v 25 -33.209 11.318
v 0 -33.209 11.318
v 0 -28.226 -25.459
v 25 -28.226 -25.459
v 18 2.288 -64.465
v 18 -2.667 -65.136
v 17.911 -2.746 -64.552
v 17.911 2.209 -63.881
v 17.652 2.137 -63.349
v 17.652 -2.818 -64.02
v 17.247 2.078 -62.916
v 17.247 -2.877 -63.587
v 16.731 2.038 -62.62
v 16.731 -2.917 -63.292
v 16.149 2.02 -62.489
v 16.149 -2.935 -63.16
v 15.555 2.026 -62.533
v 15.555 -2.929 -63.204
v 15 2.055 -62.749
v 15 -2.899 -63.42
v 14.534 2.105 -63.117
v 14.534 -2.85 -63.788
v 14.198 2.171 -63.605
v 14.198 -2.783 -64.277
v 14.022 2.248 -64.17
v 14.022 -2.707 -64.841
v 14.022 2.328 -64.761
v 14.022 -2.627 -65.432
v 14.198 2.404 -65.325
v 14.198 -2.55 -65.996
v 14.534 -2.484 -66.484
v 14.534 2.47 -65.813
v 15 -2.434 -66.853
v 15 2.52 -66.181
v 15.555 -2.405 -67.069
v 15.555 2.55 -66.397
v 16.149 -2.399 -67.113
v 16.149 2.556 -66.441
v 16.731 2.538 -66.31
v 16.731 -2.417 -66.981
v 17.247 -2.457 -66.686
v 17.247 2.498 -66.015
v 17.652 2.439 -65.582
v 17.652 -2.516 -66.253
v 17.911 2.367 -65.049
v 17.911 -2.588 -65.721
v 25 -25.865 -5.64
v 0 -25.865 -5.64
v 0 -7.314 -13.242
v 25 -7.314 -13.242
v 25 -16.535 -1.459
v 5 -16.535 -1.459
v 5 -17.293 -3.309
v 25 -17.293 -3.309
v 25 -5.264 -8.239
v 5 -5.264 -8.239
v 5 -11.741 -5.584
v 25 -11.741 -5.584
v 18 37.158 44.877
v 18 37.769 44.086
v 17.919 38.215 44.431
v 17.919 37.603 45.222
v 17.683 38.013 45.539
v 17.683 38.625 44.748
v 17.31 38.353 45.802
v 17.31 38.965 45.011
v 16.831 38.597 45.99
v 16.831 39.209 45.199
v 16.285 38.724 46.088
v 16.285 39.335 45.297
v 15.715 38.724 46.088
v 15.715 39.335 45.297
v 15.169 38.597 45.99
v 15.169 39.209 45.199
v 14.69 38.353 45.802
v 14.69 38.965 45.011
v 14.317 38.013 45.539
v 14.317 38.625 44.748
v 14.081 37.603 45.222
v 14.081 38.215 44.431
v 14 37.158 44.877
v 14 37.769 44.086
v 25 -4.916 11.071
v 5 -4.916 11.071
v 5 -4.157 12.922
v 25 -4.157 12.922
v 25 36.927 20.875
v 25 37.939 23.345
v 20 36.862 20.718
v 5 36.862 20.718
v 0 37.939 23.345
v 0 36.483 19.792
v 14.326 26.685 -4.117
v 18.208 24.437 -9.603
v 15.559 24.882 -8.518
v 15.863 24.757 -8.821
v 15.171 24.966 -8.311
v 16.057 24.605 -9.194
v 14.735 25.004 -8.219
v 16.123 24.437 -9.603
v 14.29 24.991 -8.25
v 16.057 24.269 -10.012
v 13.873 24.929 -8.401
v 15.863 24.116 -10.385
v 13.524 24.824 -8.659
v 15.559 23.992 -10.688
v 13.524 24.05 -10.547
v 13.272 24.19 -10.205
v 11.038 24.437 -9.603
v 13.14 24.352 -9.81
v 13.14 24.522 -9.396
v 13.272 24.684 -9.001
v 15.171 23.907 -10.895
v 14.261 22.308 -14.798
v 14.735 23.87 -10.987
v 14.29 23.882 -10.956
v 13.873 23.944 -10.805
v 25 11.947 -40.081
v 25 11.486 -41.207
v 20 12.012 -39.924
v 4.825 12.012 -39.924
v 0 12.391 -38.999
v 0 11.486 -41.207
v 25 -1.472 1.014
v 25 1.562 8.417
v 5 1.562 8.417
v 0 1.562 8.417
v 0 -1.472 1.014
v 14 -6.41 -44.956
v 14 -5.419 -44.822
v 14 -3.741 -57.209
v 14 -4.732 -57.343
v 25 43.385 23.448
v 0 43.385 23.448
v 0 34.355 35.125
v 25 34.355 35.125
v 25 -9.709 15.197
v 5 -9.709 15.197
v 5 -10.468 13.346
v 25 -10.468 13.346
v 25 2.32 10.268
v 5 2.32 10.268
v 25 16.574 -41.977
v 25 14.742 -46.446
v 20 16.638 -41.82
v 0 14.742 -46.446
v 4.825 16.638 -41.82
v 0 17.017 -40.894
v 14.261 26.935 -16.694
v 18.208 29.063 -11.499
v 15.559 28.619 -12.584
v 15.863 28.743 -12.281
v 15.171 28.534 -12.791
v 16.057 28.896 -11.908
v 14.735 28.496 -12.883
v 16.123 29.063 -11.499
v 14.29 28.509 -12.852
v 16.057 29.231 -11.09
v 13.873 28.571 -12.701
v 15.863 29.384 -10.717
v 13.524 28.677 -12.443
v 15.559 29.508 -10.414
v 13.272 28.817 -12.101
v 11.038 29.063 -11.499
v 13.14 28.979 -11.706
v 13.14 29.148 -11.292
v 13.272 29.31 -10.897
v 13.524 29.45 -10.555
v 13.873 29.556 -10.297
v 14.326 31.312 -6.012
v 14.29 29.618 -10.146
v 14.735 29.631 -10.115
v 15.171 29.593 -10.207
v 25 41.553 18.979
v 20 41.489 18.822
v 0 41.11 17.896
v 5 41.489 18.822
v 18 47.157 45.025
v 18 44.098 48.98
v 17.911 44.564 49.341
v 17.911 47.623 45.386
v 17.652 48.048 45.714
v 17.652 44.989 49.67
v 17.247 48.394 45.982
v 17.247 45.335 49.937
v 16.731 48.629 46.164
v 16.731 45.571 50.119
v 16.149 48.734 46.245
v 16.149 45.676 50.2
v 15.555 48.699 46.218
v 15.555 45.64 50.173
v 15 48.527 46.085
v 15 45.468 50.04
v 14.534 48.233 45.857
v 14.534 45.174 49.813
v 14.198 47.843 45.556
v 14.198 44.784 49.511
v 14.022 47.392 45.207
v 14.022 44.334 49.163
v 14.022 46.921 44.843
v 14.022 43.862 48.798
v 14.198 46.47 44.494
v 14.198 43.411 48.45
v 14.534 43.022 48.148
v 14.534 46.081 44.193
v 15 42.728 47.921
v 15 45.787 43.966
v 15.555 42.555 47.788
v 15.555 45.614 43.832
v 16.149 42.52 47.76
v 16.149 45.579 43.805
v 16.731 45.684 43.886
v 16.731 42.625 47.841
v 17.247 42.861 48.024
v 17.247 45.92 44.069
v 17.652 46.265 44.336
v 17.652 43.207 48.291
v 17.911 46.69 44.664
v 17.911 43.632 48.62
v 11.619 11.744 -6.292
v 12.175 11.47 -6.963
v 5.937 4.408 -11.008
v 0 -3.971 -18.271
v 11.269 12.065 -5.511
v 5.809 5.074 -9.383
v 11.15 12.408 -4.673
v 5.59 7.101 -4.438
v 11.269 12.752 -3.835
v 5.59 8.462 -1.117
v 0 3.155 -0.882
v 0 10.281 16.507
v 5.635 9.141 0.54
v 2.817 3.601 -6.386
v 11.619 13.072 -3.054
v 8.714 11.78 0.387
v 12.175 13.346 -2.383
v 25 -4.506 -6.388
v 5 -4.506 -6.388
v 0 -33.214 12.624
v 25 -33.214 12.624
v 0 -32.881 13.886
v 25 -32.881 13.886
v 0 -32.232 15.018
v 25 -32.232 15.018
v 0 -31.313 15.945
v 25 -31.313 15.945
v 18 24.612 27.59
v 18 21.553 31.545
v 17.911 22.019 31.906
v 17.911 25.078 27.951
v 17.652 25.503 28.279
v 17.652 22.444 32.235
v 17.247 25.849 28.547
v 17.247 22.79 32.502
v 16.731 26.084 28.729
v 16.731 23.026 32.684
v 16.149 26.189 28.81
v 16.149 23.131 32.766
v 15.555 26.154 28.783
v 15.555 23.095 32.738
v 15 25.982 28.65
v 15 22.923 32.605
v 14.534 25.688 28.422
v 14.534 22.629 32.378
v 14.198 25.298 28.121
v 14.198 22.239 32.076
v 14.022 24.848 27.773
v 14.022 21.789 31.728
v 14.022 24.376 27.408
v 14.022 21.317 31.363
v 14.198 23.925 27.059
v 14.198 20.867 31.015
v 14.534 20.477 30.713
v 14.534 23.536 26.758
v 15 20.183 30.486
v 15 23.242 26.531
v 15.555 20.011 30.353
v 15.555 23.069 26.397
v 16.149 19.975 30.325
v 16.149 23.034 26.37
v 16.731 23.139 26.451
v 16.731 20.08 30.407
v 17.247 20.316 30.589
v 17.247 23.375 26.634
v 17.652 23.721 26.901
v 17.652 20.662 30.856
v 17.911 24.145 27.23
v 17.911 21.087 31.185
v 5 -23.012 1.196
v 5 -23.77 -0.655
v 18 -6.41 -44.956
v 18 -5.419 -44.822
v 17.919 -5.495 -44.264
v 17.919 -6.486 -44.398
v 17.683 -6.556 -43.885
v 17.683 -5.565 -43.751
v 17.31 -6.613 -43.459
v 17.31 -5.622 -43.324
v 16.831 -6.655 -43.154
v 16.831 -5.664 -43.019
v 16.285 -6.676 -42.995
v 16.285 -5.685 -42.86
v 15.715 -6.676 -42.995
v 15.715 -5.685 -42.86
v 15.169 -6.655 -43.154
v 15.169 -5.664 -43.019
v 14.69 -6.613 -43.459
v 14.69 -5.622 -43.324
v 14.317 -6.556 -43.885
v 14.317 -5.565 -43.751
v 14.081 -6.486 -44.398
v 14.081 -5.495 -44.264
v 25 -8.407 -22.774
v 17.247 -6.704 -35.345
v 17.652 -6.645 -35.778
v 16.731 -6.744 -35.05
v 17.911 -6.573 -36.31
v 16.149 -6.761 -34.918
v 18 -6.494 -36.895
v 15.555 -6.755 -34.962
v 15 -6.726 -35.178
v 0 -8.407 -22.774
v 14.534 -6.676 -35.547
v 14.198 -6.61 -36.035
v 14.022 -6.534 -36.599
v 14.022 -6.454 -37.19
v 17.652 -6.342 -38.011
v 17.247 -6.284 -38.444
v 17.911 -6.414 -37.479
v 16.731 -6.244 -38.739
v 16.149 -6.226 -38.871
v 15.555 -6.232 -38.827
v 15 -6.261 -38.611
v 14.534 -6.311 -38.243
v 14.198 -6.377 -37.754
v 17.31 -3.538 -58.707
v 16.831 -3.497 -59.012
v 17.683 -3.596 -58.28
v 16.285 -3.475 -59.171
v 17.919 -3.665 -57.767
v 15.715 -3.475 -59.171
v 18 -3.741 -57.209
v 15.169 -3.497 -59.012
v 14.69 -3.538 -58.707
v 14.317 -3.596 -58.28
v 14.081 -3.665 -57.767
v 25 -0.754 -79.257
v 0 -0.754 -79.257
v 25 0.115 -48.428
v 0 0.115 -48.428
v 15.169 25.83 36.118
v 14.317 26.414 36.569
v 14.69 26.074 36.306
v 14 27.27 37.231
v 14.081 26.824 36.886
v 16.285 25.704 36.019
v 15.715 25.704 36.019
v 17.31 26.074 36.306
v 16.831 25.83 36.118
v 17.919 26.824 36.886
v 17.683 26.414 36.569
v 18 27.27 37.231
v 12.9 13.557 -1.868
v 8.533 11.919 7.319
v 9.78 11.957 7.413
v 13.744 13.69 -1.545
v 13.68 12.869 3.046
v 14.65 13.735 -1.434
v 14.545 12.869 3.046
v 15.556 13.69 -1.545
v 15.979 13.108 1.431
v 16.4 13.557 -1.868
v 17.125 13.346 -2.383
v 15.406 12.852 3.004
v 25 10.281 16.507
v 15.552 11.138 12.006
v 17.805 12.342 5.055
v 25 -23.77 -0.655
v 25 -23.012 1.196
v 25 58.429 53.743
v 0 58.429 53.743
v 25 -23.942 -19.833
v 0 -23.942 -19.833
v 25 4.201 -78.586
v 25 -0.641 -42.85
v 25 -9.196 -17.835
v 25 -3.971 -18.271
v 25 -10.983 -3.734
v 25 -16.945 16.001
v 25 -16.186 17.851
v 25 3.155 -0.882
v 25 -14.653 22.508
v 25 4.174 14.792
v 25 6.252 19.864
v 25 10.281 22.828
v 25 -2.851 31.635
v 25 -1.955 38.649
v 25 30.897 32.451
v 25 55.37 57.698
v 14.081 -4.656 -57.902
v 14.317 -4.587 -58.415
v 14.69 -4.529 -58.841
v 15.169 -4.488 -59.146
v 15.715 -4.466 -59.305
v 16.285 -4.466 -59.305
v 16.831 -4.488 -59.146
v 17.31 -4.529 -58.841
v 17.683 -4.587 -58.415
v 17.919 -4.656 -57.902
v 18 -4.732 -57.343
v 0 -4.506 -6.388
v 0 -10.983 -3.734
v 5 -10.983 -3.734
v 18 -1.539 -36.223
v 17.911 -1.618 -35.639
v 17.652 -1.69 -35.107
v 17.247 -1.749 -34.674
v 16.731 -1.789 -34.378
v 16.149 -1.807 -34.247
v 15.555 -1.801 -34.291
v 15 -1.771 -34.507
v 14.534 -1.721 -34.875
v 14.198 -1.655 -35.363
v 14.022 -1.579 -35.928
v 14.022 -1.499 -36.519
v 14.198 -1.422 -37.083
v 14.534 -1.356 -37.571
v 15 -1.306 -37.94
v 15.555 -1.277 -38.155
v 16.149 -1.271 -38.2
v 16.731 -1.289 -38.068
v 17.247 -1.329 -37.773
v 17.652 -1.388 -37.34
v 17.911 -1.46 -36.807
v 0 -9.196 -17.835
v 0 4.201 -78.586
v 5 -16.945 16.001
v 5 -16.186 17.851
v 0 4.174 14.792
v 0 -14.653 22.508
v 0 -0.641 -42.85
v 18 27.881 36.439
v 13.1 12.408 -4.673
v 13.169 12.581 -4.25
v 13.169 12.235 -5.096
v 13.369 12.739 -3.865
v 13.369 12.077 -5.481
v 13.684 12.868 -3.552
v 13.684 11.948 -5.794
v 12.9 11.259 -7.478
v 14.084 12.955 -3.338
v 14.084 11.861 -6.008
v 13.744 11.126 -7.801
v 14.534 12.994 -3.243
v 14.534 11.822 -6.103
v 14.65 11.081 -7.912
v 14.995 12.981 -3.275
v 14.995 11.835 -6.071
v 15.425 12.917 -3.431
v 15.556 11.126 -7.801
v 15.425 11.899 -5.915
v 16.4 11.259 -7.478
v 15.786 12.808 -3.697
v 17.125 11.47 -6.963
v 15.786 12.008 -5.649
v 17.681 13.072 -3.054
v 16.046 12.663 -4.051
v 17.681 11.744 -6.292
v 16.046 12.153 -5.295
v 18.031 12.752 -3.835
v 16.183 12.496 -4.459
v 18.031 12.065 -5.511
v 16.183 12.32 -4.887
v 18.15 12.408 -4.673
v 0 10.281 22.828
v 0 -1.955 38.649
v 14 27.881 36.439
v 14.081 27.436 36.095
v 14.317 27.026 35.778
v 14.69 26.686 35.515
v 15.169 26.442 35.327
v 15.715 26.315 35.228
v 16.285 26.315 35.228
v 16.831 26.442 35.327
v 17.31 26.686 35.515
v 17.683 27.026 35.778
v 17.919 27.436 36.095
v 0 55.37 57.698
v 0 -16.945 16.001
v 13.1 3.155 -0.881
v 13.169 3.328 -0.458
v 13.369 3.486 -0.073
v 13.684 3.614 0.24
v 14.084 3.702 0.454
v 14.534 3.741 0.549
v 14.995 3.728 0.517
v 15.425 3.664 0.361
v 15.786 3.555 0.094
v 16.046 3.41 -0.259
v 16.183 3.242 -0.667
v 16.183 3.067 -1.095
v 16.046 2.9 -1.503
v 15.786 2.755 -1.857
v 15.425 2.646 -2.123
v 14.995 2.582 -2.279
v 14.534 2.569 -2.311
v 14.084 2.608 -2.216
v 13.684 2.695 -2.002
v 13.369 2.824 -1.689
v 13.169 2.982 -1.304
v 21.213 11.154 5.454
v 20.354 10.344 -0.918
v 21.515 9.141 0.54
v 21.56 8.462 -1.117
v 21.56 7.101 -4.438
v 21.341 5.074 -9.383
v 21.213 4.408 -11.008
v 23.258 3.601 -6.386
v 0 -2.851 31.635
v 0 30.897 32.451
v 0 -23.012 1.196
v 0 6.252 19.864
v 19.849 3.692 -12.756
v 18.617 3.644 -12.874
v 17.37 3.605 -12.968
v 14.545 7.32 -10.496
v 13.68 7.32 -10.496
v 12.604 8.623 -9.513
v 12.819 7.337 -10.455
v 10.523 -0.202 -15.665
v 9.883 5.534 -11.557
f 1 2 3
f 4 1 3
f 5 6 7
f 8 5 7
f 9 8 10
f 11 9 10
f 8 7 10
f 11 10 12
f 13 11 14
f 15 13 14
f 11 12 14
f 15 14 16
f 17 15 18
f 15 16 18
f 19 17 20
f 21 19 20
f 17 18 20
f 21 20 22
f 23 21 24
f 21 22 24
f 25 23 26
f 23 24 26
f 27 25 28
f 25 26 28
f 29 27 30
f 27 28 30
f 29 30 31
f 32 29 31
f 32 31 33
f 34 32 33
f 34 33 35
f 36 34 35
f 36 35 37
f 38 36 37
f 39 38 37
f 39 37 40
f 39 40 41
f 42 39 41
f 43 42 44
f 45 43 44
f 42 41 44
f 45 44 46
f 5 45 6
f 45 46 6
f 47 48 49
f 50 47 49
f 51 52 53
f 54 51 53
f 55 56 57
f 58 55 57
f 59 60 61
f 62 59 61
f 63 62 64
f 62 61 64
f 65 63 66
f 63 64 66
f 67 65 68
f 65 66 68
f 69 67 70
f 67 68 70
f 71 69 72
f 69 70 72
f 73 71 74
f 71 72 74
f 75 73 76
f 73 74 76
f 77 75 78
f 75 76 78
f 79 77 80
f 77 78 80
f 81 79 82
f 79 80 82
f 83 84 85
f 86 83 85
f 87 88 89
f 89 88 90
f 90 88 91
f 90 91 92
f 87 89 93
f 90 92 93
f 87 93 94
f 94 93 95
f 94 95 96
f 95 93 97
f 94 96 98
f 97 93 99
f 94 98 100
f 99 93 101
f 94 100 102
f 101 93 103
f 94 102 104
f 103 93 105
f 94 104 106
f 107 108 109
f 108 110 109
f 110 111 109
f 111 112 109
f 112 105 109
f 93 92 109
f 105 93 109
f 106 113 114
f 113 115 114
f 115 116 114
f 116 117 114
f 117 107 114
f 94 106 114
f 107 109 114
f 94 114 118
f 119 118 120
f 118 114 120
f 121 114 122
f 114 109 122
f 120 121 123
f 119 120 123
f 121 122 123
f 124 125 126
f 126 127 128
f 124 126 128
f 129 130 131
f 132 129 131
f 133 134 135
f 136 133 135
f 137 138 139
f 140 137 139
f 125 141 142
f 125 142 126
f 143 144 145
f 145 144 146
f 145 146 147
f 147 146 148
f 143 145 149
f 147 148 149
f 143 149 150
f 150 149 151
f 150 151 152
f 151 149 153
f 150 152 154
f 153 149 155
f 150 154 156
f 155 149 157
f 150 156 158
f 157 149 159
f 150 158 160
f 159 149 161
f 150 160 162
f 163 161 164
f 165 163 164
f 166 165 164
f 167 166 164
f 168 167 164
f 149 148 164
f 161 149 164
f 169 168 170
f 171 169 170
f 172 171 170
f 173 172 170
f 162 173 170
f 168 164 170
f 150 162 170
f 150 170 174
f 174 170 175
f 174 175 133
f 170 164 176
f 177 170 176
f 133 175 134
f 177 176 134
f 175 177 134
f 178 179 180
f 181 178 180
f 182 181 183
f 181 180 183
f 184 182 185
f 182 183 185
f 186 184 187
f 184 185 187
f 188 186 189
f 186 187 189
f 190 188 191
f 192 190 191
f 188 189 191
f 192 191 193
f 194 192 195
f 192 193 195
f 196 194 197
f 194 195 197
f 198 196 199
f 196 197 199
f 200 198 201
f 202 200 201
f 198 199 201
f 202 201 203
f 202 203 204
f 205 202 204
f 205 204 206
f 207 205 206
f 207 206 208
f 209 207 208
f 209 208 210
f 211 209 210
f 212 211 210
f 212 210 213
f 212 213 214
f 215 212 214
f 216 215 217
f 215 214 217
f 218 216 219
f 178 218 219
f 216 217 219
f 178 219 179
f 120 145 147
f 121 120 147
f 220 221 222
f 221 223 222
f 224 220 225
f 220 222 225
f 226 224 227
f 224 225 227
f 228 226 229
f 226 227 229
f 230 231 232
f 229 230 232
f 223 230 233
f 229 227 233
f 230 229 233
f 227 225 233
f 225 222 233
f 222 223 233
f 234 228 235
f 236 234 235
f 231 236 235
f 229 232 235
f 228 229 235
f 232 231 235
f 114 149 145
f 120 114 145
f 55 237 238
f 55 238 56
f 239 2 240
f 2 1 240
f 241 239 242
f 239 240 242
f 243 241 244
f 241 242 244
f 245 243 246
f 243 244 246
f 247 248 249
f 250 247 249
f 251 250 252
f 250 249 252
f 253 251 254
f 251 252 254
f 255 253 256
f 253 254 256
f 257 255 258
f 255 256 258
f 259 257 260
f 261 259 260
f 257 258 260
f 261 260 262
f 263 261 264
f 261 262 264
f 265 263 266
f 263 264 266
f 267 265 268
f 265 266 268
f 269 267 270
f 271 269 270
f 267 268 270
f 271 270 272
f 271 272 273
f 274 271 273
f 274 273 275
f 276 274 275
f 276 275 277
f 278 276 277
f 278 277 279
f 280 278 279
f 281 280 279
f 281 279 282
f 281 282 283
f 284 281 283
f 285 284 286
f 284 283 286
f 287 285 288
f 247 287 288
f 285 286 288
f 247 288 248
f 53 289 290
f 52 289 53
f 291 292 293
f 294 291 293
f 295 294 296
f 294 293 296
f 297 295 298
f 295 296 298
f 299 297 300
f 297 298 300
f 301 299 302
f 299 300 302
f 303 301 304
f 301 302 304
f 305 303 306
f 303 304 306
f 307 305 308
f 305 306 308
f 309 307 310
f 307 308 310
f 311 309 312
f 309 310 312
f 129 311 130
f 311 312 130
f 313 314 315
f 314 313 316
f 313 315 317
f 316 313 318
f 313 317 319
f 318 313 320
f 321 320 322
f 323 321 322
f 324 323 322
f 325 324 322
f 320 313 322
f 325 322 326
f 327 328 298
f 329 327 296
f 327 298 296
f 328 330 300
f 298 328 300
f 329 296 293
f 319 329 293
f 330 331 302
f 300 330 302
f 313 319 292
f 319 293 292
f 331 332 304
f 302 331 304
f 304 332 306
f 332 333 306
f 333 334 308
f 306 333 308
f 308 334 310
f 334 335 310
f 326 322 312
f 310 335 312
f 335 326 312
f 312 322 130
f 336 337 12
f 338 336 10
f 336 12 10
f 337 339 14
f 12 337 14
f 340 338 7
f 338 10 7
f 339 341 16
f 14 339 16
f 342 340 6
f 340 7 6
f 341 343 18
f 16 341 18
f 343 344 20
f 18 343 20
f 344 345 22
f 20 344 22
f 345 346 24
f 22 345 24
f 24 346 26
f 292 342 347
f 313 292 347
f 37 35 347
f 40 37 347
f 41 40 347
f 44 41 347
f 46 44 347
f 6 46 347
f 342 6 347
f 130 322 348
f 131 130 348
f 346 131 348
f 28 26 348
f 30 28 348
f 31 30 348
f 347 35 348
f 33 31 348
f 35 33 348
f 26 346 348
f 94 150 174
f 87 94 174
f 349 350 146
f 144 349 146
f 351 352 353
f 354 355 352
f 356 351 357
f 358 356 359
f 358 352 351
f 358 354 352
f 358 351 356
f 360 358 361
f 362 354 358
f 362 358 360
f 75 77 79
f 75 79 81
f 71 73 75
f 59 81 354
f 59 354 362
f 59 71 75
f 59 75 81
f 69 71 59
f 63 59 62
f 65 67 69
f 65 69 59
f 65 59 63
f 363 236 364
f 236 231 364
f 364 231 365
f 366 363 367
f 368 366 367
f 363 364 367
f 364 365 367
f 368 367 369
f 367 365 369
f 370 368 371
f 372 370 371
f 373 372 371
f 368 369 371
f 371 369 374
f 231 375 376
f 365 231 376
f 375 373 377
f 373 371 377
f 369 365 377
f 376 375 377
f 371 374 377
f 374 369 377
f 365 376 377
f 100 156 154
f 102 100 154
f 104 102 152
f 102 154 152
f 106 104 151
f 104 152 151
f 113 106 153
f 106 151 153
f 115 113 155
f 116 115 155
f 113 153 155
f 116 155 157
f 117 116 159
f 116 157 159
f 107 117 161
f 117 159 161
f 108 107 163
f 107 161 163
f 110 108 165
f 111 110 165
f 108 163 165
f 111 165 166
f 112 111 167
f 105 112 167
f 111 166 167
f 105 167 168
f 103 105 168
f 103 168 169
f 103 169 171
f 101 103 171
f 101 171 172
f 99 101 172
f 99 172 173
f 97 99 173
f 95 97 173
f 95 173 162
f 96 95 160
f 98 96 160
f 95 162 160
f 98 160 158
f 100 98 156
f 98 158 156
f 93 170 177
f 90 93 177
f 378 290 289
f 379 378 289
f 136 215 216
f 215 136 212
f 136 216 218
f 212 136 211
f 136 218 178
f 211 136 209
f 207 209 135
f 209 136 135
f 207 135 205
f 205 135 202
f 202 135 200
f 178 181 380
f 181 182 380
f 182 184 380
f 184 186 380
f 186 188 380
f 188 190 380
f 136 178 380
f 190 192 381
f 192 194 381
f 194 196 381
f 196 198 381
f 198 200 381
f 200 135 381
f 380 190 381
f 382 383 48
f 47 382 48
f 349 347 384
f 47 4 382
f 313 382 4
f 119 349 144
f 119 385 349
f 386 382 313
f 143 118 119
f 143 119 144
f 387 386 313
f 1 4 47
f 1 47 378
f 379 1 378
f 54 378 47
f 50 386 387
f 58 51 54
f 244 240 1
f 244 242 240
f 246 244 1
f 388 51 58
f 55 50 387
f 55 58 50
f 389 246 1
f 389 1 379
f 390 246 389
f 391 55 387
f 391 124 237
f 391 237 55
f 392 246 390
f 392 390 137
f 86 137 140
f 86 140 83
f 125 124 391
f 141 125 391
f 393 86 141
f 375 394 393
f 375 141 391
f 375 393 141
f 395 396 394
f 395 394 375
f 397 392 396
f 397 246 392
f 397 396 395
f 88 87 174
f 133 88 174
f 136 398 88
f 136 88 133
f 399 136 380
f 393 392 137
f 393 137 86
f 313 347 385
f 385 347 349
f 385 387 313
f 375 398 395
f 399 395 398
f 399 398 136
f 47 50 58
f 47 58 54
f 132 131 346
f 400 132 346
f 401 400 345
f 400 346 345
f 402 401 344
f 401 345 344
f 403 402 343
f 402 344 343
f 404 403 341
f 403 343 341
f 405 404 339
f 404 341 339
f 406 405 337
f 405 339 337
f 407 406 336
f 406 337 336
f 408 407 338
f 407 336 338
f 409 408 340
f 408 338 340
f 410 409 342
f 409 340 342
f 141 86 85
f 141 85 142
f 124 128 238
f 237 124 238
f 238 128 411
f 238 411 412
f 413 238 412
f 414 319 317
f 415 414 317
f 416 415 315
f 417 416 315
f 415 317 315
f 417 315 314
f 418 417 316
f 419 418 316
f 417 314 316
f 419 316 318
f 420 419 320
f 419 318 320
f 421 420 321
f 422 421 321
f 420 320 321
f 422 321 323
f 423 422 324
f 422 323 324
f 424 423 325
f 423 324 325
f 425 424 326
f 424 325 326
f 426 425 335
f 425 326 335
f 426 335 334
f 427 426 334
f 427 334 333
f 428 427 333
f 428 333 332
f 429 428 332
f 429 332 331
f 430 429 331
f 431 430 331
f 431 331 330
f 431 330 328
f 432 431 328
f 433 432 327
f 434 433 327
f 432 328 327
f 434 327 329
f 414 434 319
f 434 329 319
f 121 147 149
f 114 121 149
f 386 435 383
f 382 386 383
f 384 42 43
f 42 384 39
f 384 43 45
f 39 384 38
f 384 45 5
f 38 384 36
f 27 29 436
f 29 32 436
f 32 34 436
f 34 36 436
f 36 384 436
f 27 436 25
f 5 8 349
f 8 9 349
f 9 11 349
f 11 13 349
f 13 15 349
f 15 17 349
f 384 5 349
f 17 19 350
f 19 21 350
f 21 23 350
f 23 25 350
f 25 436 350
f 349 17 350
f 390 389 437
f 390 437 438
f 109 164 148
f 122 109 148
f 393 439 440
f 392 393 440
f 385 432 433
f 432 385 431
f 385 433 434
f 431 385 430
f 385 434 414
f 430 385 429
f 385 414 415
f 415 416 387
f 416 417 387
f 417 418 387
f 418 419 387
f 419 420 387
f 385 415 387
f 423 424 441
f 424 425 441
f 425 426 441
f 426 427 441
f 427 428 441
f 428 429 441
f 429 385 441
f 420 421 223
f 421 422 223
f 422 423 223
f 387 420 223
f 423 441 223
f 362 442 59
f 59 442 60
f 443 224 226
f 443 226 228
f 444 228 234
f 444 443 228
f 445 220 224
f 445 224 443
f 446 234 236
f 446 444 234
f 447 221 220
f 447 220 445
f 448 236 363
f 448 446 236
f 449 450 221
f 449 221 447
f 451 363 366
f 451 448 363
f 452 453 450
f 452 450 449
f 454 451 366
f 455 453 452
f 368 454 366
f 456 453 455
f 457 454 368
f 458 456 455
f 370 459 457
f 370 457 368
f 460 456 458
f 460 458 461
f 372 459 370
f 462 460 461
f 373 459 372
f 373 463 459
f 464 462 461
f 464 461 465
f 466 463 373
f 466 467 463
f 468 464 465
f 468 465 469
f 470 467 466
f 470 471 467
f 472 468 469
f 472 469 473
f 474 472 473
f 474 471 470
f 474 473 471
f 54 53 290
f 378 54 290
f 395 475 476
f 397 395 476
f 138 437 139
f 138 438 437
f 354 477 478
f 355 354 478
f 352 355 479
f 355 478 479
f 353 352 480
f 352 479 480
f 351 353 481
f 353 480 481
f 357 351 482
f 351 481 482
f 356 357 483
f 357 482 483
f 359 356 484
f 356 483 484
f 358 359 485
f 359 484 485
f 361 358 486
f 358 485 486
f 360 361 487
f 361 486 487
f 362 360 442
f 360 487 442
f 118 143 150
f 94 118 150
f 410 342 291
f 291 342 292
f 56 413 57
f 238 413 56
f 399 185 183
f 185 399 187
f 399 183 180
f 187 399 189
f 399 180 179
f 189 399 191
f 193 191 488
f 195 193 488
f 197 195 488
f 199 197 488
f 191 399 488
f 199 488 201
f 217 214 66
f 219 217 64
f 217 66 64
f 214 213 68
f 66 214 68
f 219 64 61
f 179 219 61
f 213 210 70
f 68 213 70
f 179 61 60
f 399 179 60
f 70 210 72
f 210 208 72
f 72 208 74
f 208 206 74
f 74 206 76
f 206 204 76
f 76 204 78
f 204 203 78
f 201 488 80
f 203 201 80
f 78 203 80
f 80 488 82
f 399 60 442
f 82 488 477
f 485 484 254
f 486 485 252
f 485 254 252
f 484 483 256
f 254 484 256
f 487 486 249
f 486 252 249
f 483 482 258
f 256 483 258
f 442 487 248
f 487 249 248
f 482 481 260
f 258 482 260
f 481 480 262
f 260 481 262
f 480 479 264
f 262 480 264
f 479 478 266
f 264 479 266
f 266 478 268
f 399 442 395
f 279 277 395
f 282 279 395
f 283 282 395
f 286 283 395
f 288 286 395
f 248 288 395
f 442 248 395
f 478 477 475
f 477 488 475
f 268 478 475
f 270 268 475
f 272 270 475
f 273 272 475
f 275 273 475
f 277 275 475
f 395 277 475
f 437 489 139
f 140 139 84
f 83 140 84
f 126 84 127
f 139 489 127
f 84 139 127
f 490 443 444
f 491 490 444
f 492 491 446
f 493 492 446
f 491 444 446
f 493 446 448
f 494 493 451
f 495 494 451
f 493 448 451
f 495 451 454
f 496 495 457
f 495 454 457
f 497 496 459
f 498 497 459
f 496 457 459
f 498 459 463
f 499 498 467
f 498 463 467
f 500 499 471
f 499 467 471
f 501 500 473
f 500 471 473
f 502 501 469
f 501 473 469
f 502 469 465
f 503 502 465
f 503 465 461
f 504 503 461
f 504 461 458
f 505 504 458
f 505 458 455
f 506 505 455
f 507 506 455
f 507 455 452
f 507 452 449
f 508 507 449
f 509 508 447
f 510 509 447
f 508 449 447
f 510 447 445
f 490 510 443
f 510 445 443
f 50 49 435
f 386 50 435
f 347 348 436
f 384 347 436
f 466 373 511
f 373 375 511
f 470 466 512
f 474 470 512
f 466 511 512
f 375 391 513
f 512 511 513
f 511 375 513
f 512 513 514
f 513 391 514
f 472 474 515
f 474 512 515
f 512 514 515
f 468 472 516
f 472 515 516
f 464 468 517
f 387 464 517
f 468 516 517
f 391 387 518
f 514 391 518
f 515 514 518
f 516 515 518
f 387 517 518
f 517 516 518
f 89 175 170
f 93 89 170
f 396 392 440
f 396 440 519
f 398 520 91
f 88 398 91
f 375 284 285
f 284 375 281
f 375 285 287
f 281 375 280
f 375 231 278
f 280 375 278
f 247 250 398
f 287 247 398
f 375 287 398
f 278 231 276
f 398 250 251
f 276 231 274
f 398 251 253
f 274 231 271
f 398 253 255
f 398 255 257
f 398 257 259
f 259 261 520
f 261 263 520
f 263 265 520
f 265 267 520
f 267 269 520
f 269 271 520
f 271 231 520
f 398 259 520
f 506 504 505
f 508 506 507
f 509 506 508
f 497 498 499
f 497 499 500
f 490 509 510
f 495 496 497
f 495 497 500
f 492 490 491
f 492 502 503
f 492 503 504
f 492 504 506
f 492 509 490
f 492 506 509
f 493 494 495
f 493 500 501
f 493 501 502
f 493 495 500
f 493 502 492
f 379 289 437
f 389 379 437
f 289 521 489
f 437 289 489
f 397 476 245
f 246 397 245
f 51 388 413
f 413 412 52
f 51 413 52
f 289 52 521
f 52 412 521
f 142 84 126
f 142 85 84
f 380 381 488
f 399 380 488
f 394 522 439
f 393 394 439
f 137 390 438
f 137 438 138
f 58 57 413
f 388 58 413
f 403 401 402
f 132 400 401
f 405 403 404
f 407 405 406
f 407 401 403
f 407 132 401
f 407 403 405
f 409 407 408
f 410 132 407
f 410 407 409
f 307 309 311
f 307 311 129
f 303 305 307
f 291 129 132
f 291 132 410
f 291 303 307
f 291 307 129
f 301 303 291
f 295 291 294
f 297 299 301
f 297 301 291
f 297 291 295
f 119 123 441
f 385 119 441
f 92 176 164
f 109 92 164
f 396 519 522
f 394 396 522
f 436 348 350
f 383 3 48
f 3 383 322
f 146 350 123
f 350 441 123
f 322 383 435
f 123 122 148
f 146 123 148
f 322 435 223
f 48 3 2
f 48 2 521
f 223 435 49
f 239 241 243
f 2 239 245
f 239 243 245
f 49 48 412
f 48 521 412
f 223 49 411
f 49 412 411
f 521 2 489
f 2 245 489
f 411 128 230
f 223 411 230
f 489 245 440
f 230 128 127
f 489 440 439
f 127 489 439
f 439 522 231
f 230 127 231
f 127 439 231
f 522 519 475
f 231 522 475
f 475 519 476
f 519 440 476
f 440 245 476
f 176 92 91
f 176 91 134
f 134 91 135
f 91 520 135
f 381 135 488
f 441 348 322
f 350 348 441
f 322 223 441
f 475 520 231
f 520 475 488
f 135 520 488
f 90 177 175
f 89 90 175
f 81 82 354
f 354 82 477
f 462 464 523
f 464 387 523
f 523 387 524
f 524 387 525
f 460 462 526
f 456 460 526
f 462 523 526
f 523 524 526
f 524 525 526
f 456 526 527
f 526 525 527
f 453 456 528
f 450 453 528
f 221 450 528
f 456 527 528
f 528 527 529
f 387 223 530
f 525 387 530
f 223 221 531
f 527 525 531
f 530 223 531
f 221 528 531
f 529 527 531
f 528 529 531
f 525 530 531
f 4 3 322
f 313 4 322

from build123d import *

# Parameters (mm, degrees)
F1_DEPTH  = 25
F2_DEPTH  = 5
F3_R      = 5
F5_DEPTH  = 5
F6_W      = 25
F6_H      = 37.5846914337
F10_R     = 1.55
F11_DEPTH = 10
F14_DEPTH = 1
F15_DEPTH = 1
F16_DEPTH = 5
F17_DEPTH = 5


# Not quite as in the source:
# - a feature names something its author has since deleted; it is built from what else it names


with BuildPart() as f1:
    # F0 (on Right) → F1 (new body)
    with BuildSketch(Plane.YZ):
        Polygon((-1.9545168432, 38.6489601963), (-33.5964987424, 14.1788767986), (-28.2257758369, -25.4589250511), (-8.406874912, -22.7735635983), (-0.7535947717, -79.2574312341), (4.2011304595, -78.5860908709), (0.1149024355, -48.4283077234), (-0.6409071668, -42.8501701471), (-3.9713255886, -18.2705245759), (3.1545996335, -0.8816359607), (10.2805248557, 16.5072526545), (30.8972257421, 32.4510197574), (34.3548171712, 35.1249215027), (58.4291094867, 53.742590351), (55.370349062, 57.6978380884), (10.2805248557, 22.8279692467), align=None)
        Polygon((-25.8654488138, -5.6400241263), (-7.3142972833, -13.2422419285), (-9.1963342424, -17.8348428934), (-23.9423909688, -19.8328594567), align=None, mode=Mode.SUBTRACT)
        Polygon((1.5615552233, 8.4168698067), (-1.4719884671, 1.0143288458), (-4.5055321574, -6.3882121151), (-5.26391808, -8.2388473554), (-11.7411414209, -5.5844966263), (-17.2930471416, -3.3093388585), (-23.7702704824, -0.6549881294), (-23.0118845598, 1.1956471108), (-16.944797179, 16.0007290327), (-16.1864112564, 17.851364273), (-9.7091879156, 15.1970135439), (-4.1572821949, 12.9218557761), (2.3199411459, 10.267505047), align=None, mode=Mode.SUBTRACT)
        Polygon((-14.6534166938, 22.50764705), (-2.8510041559, 31.6349520341), (6.2523573083, 19.863500585), (4.1741345282, 14.7921613112), align=None, mode=Mode.SUBTRACT)
        Polygon((-10.4675738382, 13.3463783036), (-4.9156681175, 11.0712205358), (-4.1572821949, 12.9218557761), (-9.7091879156, 15.1970135439), align=None)
        Polygon((-11.7411414209, -5.5844966263), (-10.9827554983, -3.7338613861), (-16.534661219, -1.4587036183), (-17.2930471416, -3.3093388585), align=None)
        Polygon((43.3848339814, 23.4483111776), (34.3548171712, 35.1249215027), (30.8972257421, 32.4510197574), (37.9390681356, 23.3452947817), (11.4856577492, -41.2070815569), (-0.6409071668, -42.8501701471), (0.1149024355, -48.4283077234), (14.7421520123, -46.4463889317), align=None)
    extrude(amount=F1_DEPTH)

    # F0 (on Right) → F2 (join)
    with BuildSketch(Plane.YZ):
        Polygon((-16.944797179, 16.0007290327), (-10.4675738382, 13.3463783036), (-9.7091879156, 15.1970135439), (-16.1864112564, 17.851364273), align=None)
        Polygon((-4.9156681175, 11.0712205358), (1.5615552233, 8.4168698067), (2.3199411459, 10.267505047), (-4.1572821949, 12.9218557761), align=None)
        Polygon((-17.2930471416, -3.3093388585), (-16.534661219, -1.4587036183), (-23.0118845598, 1.1956471108), (-23.7702704824, -0.6549881294), align=None)
        Polygon((-5.26391808, -8.2388473554), (-4.5055321574, -6.3882121151), (-10.9827554983, -3.7338613861), (-11.7411414209, -5.5844966263), align=None)
    extrude(amount=F2_DEPTH)

    # F3
    f3_edges = [f1.edges().sort_by_distance(p)[0] for p in [
        (12.5, -33.596499, 14.178877),
    ]]
    fillet(f3_edges, radius=F3_R)

    # F4 (on face) → F5 (cut)
    with BuildSketch(Plane(origin=(0, 28.9192447, -11.8510377387), x_dir=(-1, 0, 0), z_dir=(0, 0.9253176201, -0.3791929613))):
        Polygon((-25, 33.3185826418), (-25, -32.5577652662), (-18.2082508509, 0.3804086878), align=None)
        Polygon((-14.2606471901, -5.2335595779), (-20, -32.3875417919), (-4.8253758508, -32.3875417919), align=None)
        Polygon((-11.0385, 0.3804086878), (0, -31.3875417919), (0, 32.1483591675), align=None)
        with BuildLine():
            ThreePointArc((-13.1233754255, 0.3804086878), (-14.6233754255, 1.8804086878), (-16.1233754255, 0.3804086878))
            Line((-16.1233754255, 0.3804086878), (-13.1233754255, 0.3804086878))
        make_face()
        with BuildLine():
            Line((-13.1233754255, 0.3804086878), (-16.1233754255, 0.3804086878))
            ThreePointArc((-16.1233754255, 0.3804086878), (-14.6233754255, -1.1195913122), (-13.1233754255, 0.3804086878))
        make_face()
        Polygon((-5, 33.1483591675), (-20, 33.1483591675), (-14.3256804669, 6.3097710203), align=None)
    extrude(amount=-F5_DEPTH, mode=Mode.SUBTRACT)

    # F8 (on offset) → F9 section 0
    with BuildSketch(Plane(origin=(0, 12.2635275379, -5.0255644353), x_dir=(-1, 0, 0), z_dir=(0, 0.9253176201, -0.3791929613))):
        with BuildLine():
            ThreePointArc((-17.1248646707, 2.8558931882), (-18.1499909365, 0.381019454), (-17.1248646707, -2.0938542801))
            ThreePointArc((-17.1248646707, -2.0938542801), (-14.6499909365, -3.118980546), (-12.1751172024, -2.0938542801))
            ThreePointArc((-12.1751172024, -2.0938542801), (-11.1499909365, 0.381019454), (-12.1751172024, 2.8558931882))
            ThreePointArc((-12.1751172024, 2.8558931882), (-14.6499909365, 3.881019454), (-17.1248646707, 2.8558931882))
        make_face()
    # F6 (on face) → F9 section 1
    with BuildSketch(Plane(origin=(0, 3.0103513367, -1.2336348224), x_dir=(-1, 0, 0), z_dir=(0, 0.9253176201, -0.3791929613))):
        with Locations((-12.5, 0.3804086878)):
            Rectangle(F6_W, F6_H)
    loft()

    # F10 (on face) → F11 (cut)
    with BuildSketch(Plane(origin=(0, 12.2635275379, -5.0255644353), x_dir=(-1, 0, 0), z_dir=(0, 0.9253176201, -0.3791929613))):
        with Locations((-14.6499909461, 0.3810196067)):
            Circle(F10_R)
    extrude(amount=-F11_DEPTH, mode=Mode.SUBTRACT)

    # F13 (on face) → F14 (join)
    with BuildSketch(Plane(origin=(0, -11.2853910764, -1.5291137632), x_dir=(1, 0, 0), z_dir=(0, -0.9909450462, -0.1342680726))):
        with BuildLine():
            ThreePointArc((14, -43.6885751417), (16, -45.6885751417), (18, -43.6885751417))
            ThreePointArc((18, -43.6885751417), (16, -41.6885751417), (14, -43.6885751417))
        make_face()
        with BuildLine():
            Line((18, -56.1885751417), (18, -43.6885751417))
            ThreePointArc((18, -43.6885751417), (16, -45.6885751417), (14, -43.6885751417))
            Line((14, -43.6885751417), (14, -56.1885751417))
            ThreePointArc((14, -56.1885751417), (16, -54.1885751417), (18, -56.1885751417))
        make_face()
        with BuildLine():
            ThreePointArc((14, -56.1885751417), (16, -58.1885751417), (18, -56.1885751417))
            ThreePointArc((18, -56.1885751417), (16, -54.1885751417), (14, -56.1885751417))
        make_face()
    extrude(amount=F14_DEPTH)

    # F12 (on face) → F15 (join)
    with BuildSketch(Plane(origin=(0, -7.1996627103, 9.3098006026), x_dir=(1, 0, 0), z_dir=(0, -0.6117520849, 0.7910495475))):
        with BuildLine():
            ThreePointArc((14, 56.8474623166), (16, 54.8474623166), (18, 56.8474623166))
            ThreePointArc((18, 56.8474623166), (16, 58.8474623166), (14, 56.8474623166))
        make_face()
        with BuildLine():
            Line((18, 44.3474623166), (18, 56.8474623166))
            ThreePointArc((18, 56.8474623166), (16, 54.8474623166), (14, 56.8474623166))
            Line((14, 56.8474623166), (14, 44.3474623166))
            ThreePointArc((14, 44.3474623166), (16, 46.3474623166), (18, 44.3474623166))
        make_face()
        with BuildLine():
            ThreePointArc((14, 44.3474623166), (16, 42.3474623166), (18, 44.3474623166))
            ThreePointArc((18, 44.3474623166), (16, 46.3474623166), (14, 44.3474623166))
        make_face()
    extrude(amount=F15_DEPTH)

    # F12 (on face) → F16 (cut)
    with BuildSketch(Plane(origin=(0, -7.1996627103, 9.3098006026), x_dir=(1, 0, 0), z_dir=(0, -0.6117520849, 0.7910495475))):
        with BuildLine():
            ThreePointArc((14, 64.8474623166), (16, 62.8474623166), (18, 64.8474623166))
            ThreePointArc((18, 64.8474623166), (16, 66.8474623166), (14, 64.8474623166))
        make_face()
        with BuildLine():
            ThreePointArc((14, 36.3474623166), (16, 34.3474623166), (18, 36.3474623166))
            ThreePointArc((18, 36.3474623166), (16, 38.3474623166), (14, 36.3474623166))
        make_face()
    extrude(amount=-F16_DEPTH, mode=Mode.SUBTRACT)

    # F13 (on face) → F17 (cut)
    with BuildSketch(Plane(origin=(0, -11.2853910764, -1.5291137632), x_dir=(1, 0, 0), z_dir=(0, -0.9909450462, -0.1342680726))):
        with BuildLine():
            ThreePointArc((14, -35.6885751417), (16, -37.6885751417), (18, -35.6885751417))
            ThreePointArc((18, -35.6885751417), (16, -33.6885751417), (14, -35.6885751417))
        make_face()
        with BuildLine():
            ThreePointArc((14, -64.1885751417), (16, -66.1885751417), (18, -64.1885751417))
            ThreePointArc((18, -64.1885751417), (16, -62.1885751417), (14, -64.1885751417))
        make_face()
    extrude(amount=-F17_DEPTH, mode=Mode.SUBTRACT)


solid = f1.part
